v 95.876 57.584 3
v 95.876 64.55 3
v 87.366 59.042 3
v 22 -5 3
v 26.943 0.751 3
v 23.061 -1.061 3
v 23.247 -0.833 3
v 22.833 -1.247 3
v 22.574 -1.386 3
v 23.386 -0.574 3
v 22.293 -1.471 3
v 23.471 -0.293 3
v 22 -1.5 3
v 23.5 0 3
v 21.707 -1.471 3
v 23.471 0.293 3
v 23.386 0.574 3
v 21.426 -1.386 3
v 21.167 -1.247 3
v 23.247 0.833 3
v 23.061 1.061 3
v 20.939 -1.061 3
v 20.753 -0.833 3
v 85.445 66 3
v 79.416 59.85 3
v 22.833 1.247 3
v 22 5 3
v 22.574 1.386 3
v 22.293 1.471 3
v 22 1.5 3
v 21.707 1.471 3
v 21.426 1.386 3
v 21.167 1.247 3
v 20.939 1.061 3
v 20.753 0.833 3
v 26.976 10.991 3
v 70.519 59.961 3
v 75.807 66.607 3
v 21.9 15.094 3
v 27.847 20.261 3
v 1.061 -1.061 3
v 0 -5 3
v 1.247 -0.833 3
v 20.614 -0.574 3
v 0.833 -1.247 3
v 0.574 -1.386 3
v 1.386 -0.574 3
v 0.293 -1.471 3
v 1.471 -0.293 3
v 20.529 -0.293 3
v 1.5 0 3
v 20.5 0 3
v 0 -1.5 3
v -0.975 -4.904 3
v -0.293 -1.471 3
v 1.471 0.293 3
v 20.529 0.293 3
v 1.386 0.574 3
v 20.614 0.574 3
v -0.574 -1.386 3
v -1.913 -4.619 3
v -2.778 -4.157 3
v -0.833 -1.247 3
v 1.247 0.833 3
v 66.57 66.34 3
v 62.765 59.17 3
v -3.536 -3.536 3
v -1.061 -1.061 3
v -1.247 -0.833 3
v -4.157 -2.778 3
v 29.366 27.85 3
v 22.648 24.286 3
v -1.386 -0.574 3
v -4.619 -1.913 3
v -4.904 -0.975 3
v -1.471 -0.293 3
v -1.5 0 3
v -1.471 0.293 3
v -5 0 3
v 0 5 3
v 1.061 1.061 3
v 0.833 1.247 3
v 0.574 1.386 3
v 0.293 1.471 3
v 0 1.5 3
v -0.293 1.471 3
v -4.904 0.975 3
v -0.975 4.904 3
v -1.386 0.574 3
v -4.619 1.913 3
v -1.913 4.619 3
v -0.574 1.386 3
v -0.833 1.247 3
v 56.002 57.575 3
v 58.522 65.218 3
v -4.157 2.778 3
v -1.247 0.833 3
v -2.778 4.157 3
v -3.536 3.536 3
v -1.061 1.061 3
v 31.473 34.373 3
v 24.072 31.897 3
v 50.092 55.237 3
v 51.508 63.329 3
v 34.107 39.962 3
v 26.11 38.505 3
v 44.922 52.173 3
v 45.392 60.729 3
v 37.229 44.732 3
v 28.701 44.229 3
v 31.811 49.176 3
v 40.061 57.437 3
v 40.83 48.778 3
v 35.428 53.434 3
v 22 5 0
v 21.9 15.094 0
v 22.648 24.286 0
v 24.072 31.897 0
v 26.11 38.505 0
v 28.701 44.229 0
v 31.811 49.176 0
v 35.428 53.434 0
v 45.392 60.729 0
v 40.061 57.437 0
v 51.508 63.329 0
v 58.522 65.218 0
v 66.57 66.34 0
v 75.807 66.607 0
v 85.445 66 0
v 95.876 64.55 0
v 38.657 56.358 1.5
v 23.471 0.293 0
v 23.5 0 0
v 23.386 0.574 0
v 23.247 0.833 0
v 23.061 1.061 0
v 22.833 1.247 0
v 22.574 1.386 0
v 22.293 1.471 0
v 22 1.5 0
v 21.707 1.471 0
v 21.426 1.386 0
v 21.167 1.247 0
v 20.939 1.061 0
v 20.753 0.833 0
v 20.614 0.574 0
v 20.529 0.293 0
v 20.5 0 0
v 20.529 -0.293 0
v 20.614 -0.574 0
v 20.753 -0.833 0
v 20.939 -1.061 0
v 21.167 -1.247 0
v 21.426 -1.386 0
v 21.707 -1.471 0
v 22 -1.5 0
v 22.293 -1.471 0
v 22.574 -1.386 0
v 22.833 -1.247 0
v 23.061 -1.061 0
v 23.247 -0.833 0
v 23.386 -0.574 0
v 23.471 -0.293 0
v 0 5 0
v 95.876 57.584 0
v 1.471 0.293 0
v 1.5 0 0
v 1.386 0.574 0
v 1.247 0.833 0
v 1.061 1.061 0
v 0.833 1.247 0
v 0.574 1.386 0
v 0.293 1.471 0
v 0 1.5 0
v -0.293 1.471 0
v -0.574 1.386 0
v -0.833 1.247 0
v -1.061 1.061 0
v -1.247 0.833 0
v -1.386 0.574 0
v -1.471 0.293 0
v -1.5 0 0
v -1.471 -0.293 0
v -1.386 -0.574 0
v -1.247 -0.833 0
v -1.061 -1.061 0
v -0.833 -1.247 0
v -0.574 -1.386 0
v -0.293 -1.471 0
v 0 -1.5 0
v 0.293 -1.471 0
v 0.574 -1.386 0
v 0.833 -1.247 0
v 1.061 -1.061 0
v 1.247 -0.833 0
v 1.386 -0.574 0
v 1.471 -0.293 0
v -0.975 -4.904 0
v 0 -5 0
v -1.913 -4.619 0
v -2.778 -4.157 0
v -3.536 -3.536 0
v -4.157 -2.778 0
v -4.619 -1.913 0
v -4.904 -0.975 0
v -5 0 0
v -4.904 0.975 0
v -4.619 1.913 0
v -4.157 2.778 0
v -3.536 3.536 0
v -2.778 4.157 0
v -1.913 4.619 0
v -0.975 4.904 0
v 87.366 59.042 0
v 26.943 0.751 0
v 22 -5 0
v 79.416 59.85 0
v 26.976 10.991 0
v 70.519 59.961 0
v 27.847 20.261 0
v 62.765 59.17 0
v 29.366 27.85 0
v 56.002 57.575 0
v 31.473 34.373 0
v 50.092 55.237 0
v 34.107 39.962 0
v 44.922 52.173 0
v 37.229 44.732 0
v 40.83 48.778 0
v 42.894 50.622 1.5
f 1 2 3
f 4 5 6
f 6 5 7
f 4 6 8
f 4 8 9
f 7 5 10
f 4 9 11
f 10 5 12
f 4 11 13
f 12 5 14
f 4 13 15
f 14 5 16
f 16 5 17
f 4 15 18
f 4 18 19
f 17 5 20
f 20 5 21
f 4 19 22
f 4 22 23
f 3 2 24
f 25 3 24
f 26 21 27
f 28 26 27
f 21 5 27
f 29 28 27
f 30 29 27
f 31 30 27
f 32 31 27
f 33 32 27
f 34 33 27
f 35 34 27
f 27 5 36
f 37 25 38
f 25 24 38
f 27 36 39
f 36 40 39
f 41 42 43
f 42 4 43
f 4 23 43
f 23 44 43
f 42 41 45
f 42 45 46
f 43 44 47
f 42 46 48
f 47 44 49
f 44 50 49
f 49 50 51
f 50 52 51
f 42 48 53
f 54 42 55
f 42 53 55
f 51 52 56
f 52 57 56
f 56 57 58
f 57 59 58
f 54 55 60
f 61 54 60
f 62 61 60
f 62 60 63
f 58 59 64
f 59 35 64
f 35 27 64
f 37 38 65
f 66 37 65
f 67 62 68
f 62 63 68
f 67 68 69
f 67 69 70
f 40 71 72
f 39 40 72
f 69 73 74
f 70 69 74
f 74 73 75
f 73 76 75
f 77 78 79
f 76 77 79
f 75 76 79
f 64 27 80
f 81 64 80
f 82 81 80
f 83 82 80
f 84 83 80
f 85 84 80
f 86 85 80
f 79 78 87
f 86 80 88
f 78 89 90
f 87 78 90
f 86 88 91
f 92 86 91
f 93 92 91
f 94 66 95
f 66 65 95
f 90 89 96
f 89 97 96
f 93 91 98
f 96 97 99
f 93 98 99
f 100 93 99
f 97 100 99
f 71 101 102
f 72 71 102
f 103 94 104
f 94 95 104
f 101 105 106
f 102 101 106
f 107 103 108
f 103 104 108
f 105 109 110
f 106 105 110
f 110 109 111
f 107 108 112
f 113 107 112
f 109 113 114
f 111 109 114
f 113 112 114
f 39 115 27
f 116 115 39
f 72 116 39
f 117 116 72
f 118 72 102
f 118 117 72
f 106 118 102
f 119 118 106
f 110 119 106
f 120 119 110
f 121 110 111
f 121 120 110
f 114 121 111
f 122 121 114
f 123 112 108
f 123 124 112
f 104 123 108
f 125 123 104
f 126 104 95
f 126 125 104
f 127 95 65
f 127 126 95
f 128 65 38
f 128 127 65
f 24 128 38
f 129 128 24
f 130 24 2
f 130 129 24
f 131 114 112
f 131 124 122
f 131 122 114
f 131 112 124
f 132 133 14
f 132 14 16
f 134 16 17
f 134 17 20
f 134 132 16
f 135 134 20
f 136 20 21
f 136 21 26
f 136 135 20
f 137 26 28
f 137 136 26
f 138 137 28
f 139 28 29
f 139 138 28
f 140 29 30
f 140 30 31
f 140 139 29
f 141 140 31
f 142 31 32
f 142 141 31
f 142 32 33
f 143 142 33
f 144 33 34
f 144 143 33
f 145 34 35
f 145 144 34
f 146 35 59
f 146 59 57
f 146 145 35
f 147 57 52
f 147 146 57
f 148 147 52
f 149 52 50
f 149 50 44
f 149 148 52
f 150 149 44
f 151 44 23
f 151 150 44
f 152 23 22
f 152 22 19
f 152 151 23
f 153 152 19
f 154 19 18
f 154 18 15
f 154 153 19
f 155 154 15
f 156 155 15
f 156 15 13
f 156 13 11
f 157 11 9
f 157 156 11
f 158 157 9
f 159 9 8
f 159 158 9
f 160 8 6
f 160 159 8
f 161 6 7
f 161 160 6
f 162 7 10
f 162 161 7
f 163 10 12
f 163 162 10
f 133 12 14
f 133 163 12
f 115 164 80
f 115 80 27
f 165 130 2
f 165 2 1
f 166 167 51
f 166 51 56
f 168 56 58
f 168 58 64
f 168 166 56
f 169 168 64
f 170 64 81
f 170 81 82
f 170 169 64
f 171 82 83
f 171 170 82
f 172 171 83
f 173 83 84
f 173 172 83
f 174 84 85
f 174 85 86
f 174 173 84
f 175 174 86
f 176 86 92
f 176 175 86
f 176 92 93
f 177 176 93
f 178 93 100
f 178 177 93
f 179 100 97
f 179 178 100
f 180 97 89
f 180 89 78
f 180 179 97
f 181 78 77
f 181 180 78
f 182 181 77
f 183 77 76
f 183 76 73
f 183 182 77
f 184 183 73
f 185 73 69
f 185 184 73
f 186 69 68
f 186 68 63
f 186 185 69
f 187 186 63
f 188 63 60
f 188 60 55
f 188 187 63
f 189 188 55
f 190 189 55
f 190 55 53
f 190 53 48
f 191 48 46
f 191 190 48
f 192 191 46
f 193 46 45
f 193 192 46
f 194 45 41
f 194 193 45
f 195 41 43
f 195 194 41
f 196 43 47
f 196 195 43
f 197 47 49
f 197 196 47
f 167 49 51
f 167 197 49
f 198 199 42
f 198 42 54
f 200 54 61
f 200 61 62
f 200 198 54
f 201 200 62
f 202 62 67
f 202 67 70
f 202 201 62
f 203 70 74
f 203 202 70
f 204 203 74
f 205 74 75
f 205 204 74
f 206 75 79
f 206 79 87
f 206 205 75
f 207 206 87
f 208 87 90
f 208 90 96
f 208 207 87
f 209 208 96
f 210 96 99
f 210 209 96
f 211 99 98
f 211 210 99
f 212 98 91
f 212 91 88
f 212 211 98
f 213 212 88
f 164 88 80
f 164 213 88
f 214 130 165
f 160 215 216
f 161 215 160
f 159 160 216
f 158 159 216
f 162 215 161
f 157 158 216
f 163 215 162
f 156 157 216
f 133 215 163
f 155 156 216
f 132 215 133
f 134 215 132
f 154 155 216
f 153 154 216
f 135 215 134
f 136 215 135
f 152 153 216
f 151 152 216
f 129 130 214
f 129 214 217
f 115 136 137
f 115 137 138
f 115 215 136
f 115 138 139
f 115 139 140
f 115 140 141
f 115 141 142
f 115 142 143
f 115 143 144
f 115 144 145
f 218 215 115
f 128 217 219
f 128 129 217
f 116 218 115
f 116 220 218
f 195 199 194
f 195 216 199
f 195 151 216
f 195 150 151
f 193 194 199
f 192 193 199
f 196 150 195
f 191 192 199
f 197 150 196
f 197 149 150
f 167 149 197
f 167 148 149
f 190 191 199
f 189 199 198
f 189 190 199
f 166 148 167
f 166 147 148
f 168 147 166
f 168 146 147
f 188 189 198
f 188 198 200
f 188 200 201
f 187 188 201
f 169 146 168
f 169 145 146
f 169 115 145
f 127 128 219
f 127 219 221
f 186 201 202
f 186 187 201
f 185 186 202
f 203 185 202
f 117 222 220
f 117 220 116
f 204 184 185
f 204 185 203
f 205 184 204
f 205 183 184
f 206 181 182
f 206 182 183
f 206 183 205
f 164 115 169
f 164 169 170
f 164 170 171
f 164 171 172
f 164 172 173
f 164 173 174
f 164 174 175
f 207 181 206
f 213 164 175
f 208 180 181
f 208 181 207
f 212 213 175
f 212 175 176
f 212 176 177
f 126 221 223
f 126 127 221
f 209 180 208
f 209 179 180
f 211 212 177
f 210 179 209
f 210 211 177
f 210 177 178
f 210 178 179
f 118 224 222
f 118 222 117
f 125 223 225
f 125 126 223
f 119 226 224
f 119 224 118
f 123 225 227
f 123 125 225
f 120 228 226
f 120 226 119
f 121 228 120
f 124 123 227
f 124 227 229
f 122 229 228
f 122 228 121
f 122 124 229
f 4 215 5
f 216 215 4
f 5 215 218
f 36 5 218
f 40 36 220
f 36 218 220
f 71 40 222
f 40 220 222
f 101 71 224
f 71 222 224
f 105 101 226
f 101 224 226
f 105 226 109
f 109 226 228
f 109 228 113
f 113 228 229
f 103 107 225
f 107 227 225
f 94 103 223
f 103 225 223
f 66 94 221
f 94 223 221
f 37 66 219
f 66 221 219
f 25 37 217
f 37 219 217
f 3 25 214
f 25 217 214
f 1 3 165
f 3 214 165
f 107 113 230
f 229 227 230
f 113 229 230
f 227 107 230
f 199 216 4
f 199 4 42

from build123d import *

# Parameters (mm, degrees)
SKETCH1_R           = 1.5
BOSS_EXTRUDE1_DEPTH = 3


with BuildPart() as part:
    # Sketch1 → Boss-Extrude1 (new body)
    with BuildSketch(Plane.XY):
        with BuildLine():
            Line((0, 5), (22, 5))
            add(Edge.make_bspline(
                [(22, 5), (18.375967342, 77.940552932), (95.875501698, 64.550484918)],
                knots=[0, 0, 0, 1, 1, 1], degree=2))
            Line((95.875501698, 64.550484918), (95.875501698, 57.584409058))
            add(Edge.make_bspline(
                [(26.94328985, 0.750923068), (24.379410311, 72.075337148), (95.875501698, 57.584409058)],
                knots=[0, 0, 0, 1, 1, 1], degree=2))
            Line((26.94328985, 0.750923068), (22, -5))
            Line((22, -5), (0, -5))
            ThreePointArc((0, -5), (-5, 0), (0, 5))
        make_face()
        Circle(SKETCH1_R, mode=Mode.SUBTRACT)
        with Locations((22, 0)):
            Circle(SKETCH1_R, mode=Mode.SUBTRACT)
    extrude(amount=BOSS_EXTRUDE1_DEPTH)


solid = part.part
